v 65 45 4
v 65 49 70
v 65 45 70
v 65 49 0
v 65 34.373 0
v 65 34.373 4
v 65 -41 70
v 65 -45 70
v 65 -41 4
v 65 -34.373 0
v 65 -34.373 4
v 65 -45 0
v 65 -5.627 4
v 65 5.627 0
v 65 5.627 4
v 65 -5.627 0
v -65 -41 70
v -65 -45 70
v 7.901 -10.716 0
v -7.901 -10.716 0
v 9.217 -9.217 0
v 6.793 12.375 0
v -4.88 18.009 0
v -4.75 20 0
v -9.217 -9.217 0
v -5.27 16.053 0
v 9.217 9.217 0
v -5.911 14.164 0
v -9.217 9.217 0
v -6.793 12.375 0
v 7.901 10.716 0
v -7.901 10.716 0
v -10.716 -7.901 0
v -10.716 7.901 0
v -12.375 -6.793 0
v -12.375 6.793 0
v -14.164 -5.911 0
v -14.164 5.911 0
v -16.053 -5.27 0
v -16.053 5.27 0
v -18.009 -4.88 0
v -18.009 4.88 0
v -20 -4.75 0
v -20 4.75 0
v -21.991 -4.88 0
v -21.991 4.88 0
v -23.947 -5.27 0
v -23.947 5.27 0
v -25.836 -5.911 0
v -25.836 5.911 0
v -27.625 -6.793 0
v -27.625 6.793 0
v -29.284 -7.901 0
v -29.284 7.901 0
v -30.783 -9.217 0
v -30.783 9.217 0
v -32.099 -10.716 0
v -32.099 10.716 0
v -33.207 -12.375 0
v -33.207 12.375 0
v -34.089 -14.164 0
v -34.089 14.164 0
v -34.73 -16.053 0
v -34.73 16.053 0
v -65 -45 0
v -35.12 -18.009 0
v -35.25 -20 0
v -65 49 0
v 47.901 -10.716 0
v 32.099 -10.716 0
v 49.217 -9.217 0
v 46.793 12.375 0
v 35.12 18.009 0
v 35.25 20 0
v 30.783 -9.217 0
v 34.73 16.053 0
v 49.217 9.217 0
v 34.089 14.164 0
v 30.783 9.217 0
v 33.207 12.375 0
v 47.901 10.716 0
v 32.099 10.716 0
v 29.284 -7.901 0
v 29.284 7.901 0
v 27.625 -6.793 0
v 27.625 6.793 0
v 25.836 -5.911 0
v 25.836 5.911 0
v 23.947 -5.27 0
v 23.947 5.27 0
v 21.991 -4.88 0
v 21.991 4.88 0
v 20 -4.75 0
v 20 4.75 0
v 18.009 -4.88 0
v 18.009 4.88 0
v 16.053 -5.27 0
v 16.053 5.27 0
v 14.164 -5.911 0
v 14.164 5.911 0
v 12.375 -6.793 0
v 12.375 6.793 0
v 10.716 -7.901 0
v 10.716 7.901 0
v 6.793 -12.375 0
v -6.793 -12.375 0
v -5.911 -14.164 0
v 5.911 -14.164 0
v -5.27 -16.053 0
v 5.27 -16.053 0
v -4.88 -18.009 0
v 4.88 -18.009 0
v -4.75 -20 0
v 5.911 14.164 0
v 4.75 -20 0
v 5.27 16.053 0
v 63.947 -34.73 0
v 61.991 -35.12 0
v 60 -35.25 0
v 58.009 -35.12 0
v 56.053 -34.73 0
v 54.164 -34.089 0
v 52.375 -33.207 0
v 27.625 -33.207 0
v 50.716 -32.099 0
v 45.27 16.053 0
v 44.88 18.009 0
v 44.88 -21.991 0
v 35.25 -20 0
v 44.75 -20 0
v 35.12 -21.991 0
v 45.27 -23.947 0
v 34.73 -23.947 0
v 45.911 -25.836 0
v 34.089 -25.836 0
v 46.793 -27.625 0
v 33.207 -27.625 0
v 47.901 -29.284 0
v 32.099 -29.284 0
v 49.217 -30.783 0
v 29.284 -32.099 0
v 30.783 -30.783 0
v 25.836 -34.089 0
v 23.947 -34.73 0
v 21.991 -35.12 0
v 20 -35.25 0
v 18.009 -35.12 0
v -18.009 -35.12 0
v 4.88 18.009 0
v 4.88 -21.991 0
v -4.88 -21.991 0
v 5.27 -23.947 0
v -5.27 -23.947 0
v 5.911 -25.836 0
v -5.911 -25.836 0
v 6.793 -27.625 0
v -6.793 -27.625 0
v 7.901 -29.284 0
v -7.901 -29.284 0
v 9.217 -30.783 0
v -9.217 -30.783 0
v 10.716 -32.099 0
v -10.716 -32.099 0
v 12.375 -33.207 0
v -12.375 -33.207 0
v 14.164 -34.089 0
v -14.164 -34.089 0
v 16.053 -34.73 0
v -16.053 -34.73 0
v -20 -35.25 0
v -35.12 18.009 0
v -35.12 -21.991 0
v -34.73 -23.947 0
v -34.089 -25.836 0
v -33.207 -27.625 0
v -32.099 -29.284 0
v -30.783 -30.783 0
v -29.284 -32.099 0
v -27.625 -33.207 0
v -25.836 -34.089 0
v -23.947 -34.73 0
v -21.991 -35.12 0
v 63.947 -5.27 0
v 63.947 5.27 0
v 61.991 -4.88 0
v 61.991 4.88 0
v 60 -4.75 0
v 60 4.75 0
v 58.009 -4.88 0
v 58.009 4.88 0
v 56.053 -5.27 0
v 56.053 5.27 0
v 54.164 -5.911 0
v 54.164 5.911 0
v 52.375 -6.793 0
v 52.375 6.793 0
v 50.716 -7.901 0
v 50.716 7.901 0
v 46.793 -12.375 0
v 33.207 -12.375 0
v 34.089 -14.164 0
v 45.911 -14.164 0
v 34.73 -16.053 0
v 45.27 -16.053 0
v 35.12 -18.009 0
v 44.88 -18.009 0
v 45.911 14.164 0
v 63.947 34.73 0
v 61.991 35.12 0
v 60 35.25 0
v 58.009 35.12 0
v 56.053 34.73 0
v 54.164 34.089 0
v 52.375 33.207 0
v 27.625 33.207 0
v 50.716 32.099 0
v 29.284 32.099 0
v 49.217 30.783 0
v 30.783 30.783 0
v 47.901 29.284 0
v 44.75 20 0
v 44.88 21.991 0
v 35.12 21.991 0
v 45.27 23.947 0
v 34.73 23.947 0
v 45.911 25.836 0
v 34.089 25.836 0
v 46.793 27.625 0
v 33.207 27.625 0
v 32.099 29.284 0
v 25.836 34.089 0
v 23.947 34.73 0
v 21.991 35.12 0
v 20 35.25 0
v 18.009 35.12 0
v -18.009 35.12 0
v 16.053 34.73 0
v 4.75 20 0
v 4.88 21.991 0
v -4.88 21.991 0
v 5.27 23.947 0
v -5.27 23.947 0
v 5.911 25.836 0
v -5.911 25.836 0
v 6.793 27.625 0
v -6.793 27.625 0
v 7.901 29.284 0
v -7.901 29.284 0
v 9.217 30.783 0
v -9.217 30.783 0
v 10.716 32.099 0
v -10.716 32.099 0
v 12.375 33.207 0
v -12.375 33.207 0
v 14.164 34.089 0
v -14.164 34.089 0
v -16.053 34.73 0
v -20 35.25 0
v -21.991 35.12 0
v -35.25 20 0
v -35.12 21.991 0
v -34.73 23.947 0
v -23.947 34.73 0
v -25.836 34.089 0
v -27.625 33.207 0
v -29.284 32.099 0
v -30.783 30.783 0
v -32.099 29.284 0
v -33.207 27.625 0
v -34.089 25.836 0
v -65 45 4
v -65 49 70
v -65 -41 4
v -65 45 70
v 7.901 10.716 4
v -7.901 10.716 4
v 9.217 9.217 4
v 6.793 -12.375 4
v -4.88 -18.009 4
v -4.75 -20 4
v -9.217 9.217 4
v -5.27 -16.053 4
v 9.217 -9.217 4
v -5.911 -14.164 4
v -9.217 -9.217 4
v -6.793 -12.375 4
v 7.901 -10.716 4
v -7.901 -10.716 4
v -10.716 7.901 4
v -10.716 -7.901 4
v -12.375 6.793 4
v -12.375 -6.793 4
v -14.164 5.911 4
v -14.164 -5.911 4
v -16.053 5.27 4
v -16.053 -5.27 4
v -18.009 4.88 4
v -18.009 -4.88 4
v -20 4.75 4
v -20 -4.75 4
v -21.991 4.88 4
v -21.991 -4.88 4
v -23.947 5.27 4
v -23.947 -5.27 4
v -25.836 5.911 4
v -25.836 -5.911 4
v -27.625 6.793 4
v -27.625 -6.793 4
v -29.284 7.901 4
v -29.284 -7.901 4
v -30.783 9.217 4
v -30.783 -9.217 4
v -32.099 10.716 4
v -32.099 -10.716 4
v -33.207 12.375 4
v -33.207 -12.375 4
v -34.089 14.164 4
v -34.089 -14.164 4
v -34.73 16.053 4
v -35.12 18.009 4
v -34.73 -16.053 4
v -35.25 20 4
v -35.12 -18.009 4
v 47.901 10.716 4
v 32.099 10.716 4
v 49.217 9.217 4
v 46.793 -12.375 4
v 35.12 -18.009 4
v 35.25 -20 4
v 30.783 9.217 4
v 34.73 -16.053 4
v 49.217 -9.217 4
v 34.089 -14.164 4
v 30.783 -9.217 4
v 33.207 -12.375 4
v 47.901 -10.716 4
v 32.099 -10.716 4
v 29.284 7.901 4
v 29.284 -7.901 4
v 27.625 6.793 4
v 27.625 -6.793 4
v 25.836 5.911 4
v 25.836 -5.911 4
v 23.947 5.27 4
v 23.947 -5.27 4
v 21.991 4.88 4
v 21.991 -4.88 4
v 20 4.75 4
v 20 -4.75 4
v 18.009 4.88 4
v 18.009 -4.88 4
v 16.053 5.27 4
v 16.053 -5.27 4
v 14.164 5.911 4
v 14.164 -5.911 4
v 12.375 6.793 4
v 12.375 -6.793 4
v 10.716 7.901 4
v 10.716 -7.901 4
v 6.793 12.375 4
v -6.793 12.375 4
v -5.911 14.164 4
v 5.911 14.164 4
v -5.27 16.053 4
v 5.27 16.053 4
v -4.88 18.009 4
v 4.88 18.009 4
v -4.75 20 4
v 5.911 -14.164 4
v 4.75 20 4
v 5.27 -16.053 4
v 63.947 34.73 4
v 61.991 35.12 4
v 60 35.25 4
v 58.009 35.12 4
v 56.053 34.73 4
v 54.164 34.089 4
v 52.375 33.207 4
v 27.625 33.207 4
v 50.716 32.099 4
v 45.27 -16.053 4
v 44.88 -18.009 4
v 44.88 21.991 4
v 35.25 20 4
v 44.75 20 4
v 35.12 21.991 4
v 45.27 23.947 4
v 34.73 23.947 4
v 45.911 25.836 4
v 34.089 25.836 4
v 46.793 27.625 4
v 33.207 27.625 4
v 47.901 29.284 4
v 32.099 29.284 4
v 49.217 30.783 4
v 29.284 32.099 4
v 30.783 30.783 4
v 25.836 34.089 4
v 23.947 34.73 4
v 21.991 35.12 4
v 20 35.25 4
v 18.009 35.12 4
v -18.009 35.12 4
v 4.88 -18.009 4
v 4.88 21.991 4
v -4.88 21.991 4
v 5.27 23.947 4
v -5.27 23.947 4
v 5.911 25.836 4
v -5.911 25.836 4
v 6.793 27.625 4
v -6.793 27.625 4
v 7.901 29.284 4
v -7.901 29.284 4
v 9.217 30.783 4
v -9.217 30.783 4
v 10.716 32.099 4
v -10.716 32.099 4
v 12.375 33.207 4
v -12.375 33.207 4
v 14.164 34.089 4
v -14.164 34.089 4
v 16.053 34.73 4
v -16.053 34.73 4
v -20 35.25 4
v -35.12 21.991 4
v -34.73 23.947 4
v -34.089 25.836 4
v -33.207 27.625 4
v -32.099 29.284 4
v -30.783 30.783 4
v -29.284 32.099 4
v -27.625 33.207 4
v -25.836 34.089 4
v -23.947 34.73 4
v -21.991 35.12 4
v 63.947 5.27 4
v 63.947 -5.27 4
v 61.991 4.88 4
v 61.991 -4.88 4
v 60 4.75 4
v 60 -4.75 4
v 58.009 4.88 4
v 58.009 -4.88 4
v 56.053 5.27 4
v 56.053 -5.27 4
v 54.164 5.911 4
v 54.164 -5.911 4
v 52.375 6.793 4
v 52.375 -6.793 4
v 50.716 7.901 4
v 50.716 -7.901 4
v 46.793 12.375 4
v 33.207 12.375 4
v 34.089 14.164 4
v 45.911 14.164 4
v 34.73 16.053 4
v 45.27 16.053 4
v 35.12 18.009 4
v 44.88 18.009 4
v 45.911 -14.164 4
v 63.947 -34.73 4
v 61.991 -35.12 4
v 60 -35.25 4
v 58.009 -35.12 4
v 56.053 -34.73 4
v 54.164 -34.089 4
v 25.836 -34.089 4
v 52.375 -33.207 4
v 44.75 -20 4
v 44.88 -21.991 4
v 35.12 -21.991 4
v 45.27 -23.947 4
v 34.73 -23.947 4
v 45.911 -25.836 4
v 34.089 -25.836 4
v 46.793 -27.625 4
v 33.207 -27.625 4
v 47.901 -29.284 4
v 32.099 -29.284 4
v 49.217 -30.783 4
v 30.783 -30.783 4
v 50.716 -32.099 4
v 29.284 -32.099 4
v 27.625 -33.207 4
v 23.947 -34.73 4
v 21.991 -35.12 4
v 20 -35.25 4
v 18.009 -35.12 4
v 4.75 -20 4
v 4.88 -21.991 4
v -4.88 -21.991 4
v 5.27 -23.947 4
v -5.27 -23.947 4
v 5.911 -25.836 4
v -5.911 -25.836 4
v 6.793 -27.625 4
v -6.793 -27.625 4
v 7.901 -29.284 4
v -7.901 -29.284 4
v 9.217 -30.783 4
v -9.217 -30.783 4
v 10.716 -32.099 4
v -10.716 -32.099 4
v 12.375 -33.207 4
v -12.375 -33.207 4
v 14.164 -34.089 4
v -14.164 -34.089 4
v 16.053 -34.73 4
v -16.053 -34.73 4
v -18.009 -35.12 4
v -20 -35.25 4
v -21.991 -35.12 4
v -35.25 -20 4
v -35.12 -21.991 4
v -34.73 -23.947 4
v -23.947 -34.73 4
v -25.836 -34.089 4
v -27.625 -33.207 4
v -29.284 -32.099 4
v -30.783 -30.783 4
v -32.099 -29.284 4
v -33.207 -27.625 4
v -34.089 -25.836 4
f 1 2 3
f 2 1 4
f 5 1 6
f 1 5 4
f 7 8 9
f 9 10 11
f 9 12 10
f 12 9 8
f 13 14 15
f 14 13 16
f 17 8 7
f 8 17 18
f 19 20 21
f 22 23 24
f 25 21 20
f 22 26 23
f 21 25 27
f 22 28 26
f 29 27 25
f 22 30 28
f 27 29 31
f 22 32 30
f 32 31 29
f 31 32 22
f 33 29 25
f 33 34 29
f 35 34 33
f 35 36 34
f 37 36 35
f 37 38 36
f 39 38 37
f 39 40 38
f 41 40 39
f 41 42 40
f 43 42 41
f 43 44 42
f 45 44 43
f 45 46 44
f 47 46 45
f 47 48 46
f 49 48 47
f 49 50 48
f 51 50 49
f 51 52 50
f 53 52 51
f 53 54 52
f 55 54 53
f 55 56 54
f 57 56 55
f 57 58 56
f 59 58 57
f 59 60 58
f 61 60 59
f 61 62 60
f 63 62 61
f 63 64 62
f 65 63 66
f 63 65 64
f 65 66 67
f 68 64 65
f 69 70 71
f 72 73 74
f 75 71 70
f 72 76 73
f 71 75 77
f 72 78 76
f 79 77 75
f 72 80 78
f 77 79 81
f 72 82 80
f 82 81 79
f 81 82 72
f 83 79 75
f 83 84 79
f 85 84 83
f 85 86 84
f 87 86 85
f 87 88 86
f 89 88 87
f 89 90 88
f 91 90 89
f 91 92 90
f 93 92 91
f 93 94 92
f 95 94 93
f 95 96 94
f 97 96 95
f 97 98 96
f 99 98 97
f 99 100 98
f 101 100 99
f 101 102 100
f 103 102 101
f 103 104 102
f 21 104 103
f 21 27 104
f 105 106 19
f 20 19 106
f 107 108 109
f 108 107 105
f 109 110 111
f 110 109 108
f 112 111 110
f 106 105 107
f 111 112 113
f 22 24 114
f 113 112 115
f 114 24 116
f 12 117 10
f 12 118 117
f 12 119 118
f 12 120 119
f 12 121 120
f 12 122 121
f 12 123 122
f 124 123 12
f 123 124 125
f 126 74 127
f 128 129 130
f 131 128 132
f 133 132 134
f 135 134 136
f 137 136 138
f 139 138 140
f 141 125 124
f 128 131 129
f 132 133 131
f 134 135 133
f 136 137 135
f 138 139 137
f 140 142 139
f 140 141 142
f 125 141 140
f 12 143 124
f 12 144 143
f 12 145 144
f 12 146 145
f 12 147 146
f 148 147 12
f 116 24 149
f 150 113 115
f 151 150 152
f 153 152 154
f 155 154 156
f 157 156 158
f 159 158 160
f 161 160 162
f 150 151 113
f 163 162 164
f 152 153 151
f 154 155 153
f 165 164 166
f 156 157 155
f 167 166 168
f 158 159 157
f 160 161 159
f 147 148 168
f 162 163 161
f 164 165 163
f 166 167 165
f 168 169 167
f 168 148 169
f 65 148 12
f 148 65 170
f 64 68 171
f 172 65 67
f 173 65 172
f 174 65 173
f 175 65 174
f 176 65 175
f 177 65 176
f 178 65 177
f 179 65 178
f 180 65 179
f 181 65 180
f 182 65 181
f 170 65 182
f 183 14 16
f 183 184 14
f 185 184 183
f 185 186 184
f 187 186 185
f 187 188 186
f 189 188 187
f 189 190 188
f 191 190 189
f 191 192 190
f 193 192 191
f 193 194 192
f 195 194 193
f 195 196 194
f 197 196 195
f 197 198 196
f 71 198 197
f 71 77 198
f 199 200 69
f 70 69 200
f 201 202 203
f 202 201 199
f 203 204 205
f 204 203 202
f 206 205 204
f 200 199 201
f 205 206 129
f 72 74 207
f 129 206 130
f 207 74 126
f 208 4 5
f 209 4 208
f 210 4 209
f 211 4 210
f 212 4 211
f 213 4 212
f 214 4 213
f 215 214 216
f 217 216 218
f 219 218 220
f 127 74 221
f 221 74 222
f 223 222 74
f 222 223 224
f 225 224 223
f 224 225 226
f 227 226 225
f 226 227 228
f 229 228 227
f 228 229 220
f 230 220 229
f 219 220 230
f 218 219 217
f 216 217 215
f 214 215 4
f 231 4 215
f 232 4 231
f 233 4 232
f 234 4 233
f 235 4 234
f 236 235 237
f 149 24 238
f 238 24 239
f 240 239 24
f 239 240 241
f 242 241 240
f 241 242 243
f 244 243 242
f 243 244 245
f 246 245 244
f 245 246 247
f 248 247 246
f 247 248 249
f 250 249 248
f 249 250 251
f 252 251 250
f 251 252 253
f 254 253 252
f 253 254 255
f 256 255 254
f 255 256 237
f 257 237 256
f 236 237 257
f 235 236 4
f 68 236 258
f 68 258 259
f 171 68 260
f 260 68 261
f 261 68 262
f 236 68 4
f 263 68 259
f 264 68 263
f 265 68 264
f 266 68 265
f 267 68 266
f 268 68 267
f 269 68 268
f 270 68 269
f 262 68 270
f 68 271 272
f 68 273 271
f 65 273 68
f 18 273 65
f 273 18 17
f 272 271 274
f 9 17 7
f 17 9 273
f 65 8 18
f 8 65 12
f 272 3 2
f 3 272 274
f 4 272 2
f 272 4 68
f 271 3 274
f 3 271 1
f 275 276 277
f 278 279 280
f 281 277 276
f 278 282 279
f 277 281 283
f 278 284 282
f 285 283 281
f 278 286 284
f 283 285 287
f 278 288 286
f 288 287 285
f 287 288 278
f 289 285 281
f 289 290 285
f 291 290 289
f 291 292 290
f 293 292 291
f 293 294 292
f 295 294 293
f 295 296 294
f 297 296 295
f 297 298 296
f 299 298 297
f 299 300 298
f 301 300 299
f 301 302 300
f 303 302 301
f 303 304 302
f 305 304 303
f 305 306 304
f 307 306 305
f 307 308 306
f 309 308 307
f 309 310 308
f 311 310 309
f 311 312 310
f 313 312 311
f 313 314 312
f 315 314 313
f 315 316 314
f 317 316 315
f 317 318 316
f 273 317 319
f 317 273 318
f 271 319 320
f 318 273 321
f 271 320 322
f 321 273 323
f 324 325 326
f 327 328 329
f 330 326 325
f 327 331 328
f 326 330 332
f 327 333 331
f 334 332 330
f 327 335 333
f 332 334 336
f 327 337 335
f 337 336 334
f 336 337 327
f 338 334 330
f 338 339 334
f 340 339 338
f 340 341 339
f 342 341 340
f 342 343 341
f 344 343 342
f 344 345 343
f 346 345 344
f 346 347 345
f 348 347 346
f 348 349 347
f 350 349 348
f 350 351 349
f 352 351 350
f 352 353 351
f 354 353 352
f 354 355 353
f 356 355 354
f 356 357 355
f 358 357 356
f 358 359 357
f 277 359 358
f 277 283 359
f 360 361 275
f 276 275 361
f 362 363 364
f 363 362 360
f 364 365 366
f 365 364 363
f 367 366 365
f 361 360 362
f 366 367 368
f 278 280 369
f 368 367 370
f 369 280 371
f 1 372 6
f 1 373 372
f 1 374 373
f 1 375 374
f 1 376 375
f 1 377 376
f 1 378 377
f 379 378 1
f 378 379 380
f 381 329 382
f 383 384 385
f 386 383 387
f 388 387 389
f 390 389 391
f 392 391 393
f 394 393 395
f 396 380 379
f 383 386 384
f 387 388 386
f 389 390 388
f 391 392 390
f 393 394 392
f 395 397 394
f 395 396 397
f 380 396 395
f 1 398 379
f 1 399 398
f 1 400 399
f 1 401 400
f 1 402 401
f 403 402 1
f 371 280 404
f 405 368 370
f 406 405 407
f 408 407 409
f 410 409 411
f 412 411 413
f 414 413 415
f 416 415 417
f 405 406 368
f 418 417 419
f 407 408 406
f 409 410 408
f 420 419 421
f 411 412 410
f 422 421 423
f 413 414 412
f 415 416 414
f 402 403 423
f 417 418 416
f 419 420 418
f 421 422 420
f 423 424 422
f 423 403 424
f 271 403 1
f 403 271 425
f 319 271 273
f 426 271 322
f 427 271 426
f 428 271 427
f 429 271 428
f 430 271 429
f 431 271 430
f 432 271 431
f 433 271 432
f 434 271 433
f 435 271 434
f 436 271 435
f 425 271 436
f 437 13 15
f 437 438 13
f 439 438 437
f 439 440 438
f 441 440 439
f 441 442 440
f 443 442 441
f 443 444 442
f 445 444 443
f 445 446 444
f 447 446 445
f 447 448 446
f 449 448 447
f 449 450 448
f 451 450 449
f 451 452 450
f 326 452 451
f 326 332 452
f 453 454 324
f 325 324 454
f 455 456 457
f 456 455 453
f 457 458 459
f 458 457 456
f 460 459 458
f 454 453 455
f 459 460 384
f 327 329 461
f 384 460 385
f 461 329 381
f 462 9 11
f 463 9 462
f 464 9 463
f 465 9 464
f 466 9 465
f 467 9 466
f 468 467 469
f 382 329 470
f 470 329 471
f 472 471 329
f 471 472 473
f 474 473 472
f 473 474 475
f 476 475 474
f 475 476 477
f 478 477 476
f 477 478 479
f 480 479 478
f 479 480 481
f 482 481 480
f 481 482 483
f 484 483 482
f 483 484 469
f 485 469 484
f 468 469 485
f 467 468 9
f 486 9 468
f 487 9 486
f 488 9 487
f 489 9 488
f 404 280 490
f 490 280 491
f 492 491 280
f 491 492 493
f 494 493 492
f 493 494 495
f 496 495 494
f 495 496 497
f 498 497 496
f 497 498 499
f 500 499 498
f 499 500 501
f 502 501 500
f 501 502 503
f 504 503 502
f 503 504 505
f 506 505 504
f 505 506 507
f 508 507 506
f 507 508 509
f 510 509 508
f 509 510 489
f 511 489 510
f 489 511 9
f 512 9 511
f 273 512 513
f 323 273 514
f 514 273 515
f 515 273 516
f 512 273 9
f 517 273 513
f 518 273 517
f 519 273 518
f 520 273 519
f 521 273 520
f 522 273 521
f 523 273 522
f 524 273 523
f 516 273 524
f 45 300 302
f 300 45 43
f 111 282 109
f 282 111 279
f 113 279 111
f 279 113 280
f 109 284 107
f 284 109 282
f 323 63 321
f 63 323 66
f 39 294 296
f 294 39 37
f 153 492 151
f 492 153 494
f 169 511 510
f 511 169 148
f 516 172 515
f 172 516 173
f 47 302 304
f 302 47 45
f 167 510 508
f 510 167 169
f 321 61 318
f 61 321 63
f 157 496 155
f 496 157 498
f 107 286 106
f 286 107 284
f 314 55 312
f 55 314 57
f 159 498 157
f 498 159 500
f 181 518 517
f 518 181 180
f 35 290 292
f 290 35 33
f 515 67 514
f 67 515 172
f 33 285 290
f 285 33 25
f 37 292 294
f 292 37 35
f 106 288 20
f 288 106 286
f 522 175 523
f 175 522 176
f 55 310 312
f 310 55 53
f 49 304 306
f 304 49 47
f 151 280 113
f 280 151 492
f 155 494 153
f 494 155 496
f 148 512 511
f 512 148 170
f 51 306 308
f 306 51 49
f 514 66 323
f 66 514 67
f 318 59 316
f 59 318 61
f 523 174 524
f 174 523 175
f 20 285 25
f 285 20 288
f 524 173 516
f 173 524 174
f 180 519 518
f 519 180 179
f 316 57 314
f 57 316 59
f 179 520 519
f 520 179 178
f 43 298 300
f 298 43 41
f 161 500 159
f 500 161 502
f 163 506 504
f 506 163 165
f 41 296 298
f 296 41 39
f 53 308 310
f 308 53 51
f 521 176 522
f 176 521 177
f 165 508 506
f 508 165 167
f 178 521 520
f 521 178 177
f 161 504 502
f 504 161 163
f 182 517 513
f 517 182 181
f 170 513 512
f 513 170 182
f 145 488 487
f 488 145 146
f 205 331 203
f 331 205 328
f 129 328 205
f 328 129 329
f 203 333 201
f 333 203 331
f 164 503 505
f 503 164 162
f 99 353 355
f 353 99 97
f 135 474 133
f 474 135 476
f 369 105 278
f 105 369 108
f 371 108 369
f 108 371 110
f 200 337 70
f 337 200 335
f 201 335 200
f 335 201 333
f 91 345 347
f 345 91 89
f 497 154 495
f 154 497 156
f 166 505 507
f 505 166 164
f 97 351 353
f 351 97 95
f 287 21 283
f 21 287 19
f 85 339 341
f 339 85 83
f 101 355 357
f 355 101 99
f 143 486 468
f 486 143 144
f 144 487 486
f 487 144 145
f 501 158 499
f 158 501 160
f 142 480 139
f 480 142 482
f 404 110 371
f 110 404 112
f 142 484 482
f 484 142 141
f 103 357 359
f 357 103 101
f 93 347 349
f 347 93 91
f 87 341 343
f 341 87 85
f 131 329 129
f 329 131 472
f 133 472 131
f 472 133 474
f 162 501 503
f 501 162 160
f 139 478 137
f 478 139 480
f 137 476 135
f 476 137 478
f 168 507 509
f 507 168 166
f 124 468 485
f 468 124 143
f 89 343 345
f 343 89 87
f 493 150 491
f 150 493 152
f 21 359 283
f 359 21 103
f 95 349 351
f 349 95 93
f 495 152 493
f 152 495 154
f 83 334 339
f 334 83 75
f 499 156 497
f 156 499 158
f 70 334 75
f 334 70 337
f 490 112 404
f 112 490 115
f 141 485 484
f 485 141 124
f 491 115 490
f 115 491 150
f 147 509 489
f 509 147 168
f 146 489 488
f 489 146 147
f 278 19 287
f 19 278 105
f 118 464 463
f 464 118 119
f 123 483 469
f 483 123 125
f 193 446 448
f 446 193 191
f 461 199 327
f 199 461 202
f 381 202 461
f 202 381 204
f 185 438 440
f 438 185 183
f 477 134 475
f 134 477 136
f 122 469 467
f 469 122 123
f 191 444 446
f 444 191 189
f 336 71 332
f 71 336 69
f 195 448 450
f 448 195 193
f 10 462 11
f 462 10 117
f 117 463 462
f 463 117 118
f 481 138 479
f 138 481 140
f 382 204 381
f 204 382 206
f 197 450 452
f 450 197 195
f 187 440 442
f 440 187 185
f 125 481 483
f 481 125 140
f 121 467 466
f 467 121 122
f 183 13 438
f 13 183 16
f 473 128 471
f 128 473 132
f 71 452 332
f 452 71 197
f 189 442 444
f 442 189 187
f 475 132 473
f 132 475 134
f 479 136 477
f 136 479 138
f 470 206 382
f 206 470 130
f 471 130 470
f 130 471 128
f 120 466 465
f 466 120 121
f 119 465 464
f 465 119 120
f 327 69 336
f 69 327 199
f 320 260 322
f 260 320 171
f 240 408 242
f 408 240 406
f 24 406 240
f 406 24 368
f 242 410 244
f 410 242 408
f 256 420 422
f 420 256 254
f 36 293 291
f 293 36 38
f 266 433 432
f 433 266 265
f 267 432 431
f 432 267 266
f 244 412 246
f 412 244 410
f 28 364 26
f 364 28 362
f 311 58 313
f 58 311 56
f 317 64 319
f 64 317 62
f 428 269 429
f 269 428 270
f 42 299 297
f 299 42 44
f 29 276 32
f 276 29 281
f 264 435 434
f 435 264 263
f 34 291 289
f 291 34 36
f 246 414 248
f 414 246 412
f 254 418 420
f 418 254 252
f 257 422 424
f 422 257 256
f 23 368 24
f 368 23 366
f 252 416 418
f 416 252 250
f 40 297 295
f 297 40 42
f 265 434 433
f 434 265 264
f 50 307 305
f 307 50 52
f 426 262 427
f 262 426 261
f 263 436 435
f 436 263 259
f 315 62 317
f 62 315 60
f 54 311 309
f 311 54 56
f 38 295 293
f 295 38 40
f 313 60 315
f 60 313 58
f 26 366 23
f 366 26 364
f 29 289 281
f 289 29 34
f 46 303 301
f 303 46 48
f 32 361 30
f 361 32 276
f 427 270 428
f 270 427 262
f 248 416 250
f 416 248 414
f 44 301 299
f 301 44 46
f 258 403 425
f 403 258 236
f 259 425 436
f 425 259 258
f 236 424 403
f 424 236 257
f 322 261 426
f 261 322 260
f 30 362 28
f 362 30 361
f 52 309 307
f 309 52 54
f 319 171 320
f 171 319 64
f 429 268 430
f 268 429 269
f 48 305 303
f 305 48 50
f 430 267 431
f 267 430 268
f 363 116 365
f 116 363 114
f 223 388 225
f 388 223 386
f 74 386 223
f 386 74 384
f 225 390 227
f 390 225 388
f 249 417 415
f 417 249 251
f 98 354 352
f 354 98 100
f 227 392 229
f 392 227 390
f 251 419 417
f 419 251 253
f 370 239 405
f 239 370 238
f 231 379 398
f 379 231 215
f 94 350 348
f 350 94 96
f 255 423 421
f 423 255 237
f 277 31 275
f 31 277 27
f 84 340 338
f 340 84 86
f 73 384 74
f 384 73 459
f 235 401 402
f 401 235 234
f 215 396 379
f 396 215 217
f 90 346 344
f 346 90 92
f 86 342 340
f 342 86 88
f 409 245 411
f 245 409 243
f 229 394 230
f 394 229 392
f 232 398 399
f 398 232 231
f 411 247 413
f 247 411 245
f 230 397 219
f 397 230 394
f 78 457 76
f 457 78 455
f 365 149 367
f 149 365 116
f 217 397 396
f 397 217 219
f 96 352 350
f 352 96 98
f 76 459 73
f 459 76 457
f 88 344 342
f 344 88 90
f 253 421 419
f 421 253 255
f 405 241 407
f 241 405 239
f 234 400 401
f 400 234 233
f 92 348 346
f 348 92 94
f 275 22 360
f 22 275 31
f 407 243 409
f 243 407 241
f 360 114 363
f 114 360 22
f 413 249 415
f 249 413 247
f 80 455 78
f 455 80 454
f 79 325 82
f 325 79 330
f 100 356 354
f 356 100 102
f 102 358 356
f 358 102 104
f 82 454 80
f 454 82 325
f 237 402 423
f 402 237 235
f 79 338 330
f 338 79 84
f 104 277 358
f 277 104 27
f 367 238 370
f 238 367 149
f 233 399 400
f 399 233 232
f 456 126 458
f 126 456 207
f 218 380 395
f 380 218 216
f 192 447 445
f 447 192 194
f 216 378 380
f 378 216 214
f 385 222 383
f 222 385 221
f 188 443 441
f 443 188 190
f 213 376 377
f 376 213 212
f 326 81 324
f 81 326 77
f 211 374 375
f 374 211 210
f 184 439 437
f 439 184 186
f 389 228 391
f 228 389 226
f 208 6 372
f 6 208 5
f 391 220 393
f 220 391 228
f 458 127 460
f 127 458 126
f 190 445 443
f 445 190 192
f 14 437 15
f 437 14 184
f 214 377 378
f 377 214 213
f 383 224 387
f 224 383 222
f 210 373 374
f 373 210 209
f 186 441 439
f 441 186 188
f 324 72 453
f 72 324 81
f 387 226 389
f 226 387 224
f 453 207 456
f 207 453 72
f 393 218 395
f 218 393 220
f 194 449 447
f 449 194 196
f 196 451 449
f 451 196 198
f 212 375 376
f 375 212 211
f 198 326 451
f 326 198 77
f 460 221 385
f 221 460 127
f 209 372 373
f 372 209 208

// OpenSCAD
// Rack for six 50 mL conical (Falcon-type) tubes - printed upside down and flipped over.
// A flat plate with six through-holes lies on the bed (z = 0 to 4); two solid walls run along
// the two long edges and rise from the plate. After flipping, the rack stands on the walls and
// the tubes pass through the holes.
//

plate_x = 130;
plate_y = 90;
plate_z = 4;
wall_h  = 70;
hole_d  = 30.5;
row_p   = 40;
col_p   = 40;

$fn = 48;

plate_t = 4;
wall_t  = 4;

difference() {
    union() {
        translate([-plate_x / 2, -plate_y / 2, 0]) cube([plate_x, plate_y, plate_z]);
        for (y = [-plate_y / 2, plate_y / 2])
            translate([-plate_x / 2, y, 0]) cube([plate_x, wall_t, wall_h]);
    }
    for (i = [0, 1], j = [0, 1, 2])
        translate([col_p * j - row_p / 2, row_p * i - col_p / 2, -1])
            cylinder(h = plate_z + 2, d = hole_d);
}
